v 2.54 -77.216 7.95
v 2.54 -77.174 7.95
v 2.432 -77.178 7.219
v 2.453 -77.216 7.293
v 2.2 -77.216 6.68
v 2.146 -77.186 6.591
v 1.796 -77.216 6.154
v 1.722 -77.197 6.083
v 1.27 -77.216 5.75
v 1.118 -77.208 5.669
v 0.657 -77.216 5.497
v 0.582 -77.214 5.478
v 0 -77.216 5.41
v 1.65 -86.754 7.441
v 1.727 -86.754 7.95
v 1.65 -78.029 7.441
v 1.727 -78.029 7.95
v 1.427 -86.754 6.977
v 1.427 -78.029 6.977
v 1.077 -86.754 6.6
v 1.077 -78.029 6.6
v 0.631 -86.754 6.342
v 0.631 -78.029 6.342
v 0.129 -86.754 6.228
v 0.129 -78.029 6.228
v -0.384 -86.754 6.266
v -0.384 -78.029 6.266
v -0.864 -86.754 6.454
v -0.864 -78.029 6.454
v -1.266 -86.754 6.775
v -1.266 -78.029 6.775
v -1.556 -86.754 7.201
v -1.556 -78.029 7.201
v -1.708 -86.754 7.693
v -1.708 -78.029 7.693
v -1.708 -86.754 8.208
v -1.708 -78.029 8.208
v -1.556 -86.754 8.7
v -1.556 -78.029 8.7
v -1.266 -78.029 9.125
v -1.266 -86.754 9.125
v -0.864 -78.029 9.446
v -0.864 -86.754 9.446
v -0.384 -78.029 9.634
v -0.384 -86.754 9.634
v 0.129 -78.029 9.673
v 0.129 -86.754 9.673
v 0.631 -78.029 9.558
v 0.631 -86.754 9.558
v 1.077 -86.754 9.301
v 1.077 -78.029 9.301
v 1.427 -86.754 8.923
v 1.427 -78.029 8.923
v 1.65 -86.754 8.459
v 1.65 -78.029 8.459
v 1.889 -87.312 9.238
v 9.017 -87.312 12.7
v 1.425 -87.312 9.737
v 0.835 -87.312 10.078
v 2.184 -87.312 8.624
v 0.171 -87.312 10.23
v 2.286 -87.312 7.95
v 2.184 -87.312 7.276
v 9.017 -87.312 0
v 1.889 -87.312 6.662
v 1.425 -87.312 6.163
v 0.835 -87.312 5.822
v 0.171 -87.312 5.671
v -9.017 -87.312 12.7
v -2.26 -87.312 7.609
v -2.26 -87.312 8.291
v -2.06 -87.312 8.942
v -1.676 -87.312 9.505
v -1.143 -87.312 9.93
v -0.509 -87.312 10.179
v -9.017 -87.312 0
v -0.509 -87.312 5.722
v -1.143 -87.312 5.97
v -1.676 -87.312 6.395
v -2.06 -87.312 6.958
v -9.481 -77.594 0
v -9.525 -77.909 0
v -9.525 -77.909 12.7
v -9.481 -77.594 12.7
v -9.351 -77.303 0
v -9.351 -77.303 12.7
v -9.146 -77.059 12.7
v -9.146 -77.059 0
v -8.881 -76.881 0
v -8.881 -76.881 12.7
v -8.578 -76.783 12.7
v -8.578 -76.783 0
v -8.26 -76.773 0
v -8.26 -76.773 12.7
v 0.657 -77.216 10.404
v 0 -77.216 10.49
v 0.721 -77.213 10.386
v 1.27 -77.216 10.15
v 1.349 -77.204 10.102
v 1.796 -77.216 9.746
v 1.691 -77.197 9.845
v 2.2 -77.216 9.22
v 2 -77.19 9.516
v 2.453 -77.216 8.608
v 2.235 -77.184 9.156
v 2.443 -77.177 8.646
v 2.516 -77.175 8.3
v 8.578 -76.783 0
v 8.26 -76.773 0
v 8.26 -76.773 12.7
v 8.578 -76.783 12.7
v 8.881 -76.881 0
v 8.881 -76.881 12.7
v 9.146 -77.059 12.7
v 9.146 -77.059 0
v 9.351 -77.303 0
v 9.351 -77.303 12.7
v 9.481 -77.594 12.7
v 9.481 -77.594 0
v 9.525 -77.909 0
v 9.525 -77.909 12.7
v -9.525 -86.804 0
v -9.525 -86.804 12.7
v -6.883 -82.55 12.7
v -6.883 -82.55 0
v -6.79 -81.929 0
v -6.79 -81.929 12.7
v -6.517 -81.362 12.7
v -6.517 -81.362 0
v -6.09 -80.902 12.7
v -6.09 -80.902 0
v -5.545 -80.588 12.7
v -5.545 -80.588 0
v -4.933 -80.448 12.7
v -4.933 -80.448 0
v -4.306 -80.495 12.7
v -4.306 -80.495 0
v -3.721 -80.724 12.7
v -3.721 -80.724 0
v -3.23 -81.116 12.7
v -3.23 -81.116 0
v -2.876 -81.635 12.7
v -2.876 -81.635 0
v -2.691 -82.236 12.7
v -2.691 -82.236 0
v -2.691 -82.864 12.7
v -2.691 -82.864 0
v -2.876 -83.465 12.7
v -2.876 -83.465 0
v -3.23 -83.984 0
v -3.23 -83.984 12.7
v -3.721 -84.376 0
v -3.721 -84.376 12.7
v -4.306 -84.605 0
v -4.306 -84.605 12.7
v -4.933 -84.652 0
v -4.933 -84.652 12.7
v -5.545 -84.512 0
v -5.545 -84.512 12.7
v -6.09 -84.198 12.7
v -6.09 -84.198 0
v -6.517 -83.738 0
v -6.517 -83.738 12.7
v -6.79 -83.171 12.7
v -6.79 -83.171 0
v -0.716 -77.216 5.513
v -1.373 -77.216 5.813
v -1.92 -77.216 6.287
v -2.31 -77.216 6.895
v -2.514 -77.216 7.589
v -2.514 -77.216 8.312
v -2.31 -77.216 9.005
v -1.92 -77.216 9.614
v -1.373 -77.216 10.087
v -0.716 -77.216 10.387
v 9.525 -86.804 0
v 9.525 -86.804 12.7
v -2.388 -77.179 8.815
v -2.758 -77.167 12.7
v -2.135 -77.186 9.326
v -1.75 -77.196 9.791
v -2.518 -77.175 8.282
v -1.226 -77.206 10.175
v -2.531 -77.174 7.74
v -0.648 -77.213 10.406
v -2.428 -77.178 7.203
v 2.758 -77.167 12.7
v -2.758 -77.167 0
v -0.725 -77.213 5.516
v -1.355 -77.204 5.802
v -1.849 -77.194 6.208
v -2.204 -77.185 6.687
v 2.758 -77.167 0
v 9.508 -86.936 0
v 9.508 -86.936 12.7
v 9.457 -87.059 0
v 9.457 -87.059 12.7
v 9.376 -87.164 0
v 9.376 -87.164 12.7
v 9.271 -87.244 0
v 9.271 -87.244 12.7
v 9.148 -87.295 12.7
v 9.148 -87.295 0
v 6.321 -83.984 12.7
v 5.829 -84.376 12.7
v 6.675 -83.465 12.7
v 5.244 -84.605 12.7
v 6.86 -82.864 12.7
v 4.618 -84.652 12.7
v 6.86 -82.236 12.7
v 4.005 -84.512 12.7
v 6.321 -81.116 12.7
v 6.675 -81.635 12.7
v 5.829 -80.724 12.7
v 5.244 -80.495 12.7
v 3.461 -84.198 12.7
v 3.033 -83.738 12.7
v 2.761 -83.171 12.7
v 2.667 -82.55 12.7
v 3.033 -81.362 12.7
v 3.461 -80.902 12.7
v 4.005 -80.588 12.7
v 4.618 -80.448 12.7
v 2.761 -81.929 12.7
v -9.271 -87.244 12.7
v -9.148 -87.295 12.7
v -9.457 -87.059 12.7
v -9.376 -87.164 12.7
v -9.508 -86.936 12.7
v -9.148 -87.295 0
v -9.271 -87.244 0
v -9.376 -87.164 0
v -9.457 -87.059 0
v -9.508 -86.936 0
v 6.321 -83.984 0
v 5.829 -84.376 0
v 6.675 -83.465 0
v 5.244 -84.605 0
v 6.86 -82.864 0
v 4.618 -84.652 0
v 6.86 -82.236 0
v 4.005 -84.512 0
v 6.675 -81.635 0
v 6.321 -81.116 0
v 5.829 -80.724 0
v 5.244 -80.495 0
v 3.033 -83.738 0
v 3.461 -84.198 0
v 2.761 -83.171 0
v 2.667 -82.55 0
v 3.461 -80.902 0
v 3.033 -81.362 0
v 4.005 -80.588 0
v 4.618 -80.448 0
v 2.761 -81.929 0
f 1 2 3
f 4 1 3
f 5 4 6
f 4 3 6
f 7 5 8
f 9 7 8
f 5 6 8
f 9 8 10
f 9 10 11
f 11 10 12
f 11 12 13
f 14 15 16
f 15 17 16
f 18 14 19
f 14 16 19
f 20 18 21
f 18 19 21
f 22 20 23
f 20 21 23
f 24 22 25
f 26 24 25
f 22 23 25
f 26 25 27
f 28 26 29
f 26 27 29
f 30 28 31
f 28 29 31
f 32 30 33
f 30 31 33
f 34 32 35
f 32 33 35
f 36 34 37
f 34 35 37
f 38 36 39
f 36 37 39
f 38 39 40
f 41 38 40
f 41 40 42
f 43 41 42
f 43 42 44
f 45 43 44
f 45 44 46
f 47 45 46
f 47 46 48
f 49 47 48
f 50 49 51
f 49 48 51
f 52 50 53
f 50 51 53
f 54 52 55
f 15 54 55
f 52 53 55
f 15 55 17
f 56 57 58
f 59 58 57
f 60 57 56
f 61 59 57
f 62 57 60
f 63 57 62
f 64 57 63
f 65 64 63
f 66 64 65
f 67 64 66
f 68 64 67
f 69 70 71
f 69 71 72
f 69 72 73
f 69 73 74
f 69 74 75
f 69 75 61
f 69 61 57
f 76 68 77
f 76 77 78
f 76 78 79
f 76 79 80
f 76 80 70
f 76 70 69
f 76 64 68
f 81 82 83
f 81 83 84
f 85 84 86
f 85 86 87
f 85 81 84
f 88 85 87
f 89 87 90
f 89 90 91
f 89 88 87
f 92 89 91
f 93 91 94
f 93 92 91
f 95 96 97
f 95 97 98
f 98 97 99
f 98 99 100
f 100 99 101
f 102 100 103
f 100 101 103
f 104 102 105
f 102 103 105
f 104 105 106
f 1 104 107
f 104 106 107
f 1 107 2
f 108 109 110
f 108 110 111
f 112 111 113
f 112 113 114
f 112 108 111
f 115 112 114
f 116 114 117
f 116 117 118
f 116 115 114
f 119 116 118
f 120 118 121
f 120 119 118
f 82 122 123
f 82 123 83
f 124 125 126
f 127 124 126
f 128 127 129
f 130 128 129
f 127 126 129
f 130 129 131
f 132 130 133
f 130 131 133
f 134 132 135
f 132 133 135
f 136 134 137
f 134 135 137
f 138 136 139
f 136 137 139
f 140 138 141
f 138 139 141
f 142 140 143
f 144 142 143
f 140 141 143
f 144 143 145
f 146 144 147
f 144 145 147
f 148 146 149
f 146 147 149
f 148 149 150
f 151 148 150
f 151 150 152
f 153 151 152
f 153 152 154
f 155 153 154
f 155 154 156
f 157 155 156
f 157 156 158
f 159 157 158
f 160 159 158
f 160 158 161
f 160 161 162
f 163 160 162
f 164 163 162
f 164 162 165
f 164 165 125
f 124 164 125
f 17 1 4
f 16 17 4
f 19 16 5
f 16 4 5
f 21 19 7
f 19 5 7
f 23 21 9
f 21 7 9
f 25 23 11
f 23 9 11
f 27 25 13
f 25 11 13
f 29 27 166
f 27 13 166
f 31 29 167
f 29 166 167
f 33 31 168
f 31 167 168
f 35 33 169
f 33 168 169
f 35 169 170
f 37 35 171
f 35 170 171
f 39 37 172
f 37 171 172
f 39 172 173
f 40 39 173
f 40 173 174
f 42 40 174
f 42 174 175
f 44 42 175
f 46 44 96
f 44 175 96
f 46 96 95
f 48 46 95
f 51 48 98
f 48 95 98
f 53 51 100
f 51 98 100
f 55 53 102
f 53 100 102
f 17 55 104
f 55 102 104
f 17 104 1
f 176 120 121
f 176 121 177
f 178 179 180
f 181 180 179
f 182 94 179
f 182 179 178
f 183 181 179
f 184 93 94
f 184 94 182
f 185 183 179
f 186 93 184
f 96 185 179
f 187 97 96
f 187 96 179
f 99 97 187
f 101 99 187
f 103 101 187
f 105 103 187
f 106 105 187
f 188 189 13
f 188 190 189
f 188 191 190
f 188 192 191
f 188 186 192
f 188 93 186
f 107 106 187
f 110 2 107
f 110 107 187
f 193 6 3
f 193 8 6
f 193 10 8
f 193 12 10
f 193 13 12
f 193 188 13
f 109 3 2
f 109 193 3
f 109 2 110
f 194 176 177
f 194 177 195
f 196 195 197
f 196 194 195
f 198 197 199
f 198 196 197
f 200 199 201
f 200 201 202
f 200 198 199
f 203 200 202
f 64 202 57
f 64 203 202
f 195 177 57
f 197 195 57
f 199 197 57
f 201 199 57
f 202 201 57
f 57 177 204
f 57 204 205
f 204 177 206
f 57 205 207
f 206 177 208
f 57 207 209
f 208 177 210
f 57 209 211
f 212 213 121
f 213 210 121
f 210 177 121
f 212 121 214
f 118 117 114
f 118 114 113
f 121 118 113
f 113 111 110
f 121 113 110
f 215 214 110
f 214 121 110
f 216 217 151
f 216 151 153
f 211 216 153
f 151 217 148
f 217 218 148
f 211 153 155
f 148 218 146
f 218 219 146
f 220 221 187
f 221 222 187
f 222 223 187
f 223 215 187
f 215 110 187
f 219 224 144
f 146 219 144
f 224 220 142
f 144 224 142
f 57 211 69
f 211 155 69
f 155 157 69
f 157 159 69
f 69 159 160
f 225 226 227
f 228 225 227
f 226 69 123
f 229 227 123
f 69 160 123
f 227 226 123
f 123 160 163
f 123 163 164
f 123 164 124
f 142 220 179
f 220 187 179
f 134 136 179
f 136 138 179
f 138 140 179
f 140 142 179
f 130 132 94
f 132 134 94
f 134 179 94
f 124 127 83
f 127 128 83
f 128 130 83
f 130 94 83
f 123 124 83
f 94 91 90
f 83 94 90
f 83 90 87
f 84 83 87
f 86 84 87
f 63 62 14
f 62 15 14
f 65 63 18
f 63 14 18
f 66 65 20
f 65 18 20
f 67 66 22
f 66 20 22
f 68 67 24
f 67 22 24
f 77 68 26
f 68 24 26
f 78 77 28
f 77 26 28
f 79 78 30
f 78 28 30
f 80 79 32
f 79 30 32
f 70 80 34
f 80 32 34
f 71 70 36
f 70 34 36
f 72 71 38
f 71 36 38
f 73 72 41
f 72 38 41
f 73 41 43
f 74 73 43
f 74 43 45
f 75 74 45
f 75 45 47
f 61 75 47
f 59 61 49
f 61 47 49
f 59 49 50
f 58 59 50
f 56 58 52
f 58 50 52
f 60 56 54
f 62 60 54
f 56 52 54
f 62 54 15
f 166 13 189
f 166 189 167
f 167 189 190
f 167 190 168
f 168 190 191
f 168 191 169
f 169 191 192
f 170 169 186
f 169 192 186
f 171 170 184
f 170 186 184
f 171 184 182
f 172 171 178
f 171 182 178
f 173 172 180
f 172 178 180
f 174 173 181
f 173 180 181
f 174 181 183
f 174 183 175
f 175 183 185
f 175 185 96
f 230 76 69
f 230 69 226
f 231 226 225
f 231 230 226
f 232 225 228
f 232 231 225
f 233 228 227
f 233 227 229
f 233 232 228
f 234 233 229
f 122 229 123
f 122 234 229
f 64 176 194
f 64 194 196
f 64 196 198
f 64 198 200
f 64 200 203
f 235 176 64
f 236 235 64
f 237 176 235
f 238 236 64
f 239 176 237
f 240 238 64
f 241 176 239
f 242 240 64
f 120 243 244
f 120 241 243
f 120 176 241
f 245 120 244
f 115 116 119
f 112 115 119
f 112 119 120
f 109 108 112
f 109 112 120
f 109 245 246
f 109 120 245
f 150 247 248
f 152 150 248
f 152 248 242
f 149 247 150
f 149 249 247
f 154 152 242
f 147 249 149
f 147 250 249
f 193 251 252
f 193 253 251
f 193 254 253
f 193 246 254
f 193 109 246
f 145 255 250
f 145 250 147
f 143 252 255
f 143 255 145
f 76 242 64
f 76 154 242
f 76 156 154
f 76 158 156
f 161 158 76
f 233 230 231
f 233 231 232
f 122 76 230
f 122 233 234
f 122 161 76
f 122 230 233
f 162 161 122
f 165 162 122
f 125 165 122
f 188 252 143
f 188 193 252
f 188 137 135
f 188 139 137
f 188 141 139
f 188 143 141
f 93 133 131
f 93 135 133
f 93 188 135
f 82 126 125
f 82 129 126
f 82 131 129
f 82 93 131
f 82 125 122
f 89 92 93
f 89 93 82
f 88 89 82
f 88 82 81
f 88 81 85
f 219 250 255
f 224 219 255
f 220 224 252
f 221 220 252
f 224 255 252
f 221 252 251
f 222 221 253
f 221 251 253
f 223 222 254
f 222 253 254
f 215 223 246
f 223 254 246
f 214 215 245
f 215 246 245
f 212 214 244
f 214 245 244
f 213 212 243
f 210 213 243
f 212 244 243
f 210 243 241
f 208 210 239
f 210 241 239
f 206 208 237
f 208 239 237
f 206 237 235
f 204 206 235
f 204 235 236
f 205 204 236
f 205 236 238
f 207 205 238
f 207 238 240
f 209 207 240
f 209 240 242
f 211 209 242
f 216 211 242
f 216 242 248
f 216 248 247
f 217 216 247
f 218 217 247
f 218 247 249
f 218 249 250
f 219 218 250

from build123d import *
from build123d.topology import SkipClean

# Parameters (mm, degrees)
BOSS_EXTRUDE1_DEPTH             = 12.7
F_19_0_166_DIAMETER_HOLE1_D     = 4.2164
F_19_0_166_DIAMETER_HOLE1_DEPTH = 15.875
F_19_0_166_DIAMETER_HOLE1_TIP   = 1.266734357


# Read off the part's stored shape, not the designer's step: #8-32 Tapped Hole1
with BuildPart() as part:
    # Sketch1 → Boss-Extrude1 (new body)
    with BuildSketch(Plane.XY):
        with BuildLine():
            Line((9.525, -77.909402237), (9.525, -86.8045))
            ThreePointArc((9.525, -86.8045), (9.376210245, -87.163710245), (9.017, -87.3125))
            Line((9.017, -87.3125), (-9.017, -87.3125))
            ThreePointArc((-9.017, -87.3125), (-9.376210245, -87.163710245), (-9.525, -86.8045))
            Line((-9.525, -86.8045), (-9.525, -77.909402237))
            ThreePointArc((-9.525, -77.909402237), (-9.145773261, -77.059049719), (-8.259734198, -76.77296039))
            ThreePointArc((-8.259734198, -76.77296039), (0, -77.216), (8.259734198, -76.77296039))
            ThreePointArc((8.259734198, -76.77296039), (9.145773261, -77.059049719), (9.525, -77.909402237))
        make_face()
    extrude(amount=BOSS_EXTRUDE1_DEPTH)

    # #19 (0.166) Diameter Hole1
    with Locations(Plane.XY.offset(12.7)):
        with Locations((4.7752, -82.55), (-4.7752, -82.55)):
            Hole(F_19_0_166_DIAMETER_HOLE1_D / 2, depth=F_19_0_166_DIAMETER_HOLE1_DEPTH)
            with Locations((0, 0, -(F_19_0_166_DIAMETER_HOLE1_DEPTH + F_19_0_166_DIAMETER_HOLE1_TIP / 2))):  # 118° drill point
                Cone(0, F_19_0_166_DIAMETER_HOLE1_D / 2, F_19_0_166_DIAMETER_HOLE1_TIP, mode=Mode.SUBTRACT)

    # #8-32 Tapped Hole1 outline → #8-32 Tapped Hole1 (revolve, cut)
    with SkipClean():  # the faces are left unmerged after this step: merging them gives an invalid solid
        with BuildSketch(Plane.XY.offset(7.9502)):
            Polygon((2.54, -77.216), (2.54, -77.174195215), (0, -77.174194503), (0, -87.3125), (2.286, -87.3125), (1.7272, -86.7537), (1.7272, -78.0288), align=None)
        revolve(axis=Axis((0, 0, 7.9502), (0, 1, 0)), mode=Mode.SUBTRACT)


solid = part.part
